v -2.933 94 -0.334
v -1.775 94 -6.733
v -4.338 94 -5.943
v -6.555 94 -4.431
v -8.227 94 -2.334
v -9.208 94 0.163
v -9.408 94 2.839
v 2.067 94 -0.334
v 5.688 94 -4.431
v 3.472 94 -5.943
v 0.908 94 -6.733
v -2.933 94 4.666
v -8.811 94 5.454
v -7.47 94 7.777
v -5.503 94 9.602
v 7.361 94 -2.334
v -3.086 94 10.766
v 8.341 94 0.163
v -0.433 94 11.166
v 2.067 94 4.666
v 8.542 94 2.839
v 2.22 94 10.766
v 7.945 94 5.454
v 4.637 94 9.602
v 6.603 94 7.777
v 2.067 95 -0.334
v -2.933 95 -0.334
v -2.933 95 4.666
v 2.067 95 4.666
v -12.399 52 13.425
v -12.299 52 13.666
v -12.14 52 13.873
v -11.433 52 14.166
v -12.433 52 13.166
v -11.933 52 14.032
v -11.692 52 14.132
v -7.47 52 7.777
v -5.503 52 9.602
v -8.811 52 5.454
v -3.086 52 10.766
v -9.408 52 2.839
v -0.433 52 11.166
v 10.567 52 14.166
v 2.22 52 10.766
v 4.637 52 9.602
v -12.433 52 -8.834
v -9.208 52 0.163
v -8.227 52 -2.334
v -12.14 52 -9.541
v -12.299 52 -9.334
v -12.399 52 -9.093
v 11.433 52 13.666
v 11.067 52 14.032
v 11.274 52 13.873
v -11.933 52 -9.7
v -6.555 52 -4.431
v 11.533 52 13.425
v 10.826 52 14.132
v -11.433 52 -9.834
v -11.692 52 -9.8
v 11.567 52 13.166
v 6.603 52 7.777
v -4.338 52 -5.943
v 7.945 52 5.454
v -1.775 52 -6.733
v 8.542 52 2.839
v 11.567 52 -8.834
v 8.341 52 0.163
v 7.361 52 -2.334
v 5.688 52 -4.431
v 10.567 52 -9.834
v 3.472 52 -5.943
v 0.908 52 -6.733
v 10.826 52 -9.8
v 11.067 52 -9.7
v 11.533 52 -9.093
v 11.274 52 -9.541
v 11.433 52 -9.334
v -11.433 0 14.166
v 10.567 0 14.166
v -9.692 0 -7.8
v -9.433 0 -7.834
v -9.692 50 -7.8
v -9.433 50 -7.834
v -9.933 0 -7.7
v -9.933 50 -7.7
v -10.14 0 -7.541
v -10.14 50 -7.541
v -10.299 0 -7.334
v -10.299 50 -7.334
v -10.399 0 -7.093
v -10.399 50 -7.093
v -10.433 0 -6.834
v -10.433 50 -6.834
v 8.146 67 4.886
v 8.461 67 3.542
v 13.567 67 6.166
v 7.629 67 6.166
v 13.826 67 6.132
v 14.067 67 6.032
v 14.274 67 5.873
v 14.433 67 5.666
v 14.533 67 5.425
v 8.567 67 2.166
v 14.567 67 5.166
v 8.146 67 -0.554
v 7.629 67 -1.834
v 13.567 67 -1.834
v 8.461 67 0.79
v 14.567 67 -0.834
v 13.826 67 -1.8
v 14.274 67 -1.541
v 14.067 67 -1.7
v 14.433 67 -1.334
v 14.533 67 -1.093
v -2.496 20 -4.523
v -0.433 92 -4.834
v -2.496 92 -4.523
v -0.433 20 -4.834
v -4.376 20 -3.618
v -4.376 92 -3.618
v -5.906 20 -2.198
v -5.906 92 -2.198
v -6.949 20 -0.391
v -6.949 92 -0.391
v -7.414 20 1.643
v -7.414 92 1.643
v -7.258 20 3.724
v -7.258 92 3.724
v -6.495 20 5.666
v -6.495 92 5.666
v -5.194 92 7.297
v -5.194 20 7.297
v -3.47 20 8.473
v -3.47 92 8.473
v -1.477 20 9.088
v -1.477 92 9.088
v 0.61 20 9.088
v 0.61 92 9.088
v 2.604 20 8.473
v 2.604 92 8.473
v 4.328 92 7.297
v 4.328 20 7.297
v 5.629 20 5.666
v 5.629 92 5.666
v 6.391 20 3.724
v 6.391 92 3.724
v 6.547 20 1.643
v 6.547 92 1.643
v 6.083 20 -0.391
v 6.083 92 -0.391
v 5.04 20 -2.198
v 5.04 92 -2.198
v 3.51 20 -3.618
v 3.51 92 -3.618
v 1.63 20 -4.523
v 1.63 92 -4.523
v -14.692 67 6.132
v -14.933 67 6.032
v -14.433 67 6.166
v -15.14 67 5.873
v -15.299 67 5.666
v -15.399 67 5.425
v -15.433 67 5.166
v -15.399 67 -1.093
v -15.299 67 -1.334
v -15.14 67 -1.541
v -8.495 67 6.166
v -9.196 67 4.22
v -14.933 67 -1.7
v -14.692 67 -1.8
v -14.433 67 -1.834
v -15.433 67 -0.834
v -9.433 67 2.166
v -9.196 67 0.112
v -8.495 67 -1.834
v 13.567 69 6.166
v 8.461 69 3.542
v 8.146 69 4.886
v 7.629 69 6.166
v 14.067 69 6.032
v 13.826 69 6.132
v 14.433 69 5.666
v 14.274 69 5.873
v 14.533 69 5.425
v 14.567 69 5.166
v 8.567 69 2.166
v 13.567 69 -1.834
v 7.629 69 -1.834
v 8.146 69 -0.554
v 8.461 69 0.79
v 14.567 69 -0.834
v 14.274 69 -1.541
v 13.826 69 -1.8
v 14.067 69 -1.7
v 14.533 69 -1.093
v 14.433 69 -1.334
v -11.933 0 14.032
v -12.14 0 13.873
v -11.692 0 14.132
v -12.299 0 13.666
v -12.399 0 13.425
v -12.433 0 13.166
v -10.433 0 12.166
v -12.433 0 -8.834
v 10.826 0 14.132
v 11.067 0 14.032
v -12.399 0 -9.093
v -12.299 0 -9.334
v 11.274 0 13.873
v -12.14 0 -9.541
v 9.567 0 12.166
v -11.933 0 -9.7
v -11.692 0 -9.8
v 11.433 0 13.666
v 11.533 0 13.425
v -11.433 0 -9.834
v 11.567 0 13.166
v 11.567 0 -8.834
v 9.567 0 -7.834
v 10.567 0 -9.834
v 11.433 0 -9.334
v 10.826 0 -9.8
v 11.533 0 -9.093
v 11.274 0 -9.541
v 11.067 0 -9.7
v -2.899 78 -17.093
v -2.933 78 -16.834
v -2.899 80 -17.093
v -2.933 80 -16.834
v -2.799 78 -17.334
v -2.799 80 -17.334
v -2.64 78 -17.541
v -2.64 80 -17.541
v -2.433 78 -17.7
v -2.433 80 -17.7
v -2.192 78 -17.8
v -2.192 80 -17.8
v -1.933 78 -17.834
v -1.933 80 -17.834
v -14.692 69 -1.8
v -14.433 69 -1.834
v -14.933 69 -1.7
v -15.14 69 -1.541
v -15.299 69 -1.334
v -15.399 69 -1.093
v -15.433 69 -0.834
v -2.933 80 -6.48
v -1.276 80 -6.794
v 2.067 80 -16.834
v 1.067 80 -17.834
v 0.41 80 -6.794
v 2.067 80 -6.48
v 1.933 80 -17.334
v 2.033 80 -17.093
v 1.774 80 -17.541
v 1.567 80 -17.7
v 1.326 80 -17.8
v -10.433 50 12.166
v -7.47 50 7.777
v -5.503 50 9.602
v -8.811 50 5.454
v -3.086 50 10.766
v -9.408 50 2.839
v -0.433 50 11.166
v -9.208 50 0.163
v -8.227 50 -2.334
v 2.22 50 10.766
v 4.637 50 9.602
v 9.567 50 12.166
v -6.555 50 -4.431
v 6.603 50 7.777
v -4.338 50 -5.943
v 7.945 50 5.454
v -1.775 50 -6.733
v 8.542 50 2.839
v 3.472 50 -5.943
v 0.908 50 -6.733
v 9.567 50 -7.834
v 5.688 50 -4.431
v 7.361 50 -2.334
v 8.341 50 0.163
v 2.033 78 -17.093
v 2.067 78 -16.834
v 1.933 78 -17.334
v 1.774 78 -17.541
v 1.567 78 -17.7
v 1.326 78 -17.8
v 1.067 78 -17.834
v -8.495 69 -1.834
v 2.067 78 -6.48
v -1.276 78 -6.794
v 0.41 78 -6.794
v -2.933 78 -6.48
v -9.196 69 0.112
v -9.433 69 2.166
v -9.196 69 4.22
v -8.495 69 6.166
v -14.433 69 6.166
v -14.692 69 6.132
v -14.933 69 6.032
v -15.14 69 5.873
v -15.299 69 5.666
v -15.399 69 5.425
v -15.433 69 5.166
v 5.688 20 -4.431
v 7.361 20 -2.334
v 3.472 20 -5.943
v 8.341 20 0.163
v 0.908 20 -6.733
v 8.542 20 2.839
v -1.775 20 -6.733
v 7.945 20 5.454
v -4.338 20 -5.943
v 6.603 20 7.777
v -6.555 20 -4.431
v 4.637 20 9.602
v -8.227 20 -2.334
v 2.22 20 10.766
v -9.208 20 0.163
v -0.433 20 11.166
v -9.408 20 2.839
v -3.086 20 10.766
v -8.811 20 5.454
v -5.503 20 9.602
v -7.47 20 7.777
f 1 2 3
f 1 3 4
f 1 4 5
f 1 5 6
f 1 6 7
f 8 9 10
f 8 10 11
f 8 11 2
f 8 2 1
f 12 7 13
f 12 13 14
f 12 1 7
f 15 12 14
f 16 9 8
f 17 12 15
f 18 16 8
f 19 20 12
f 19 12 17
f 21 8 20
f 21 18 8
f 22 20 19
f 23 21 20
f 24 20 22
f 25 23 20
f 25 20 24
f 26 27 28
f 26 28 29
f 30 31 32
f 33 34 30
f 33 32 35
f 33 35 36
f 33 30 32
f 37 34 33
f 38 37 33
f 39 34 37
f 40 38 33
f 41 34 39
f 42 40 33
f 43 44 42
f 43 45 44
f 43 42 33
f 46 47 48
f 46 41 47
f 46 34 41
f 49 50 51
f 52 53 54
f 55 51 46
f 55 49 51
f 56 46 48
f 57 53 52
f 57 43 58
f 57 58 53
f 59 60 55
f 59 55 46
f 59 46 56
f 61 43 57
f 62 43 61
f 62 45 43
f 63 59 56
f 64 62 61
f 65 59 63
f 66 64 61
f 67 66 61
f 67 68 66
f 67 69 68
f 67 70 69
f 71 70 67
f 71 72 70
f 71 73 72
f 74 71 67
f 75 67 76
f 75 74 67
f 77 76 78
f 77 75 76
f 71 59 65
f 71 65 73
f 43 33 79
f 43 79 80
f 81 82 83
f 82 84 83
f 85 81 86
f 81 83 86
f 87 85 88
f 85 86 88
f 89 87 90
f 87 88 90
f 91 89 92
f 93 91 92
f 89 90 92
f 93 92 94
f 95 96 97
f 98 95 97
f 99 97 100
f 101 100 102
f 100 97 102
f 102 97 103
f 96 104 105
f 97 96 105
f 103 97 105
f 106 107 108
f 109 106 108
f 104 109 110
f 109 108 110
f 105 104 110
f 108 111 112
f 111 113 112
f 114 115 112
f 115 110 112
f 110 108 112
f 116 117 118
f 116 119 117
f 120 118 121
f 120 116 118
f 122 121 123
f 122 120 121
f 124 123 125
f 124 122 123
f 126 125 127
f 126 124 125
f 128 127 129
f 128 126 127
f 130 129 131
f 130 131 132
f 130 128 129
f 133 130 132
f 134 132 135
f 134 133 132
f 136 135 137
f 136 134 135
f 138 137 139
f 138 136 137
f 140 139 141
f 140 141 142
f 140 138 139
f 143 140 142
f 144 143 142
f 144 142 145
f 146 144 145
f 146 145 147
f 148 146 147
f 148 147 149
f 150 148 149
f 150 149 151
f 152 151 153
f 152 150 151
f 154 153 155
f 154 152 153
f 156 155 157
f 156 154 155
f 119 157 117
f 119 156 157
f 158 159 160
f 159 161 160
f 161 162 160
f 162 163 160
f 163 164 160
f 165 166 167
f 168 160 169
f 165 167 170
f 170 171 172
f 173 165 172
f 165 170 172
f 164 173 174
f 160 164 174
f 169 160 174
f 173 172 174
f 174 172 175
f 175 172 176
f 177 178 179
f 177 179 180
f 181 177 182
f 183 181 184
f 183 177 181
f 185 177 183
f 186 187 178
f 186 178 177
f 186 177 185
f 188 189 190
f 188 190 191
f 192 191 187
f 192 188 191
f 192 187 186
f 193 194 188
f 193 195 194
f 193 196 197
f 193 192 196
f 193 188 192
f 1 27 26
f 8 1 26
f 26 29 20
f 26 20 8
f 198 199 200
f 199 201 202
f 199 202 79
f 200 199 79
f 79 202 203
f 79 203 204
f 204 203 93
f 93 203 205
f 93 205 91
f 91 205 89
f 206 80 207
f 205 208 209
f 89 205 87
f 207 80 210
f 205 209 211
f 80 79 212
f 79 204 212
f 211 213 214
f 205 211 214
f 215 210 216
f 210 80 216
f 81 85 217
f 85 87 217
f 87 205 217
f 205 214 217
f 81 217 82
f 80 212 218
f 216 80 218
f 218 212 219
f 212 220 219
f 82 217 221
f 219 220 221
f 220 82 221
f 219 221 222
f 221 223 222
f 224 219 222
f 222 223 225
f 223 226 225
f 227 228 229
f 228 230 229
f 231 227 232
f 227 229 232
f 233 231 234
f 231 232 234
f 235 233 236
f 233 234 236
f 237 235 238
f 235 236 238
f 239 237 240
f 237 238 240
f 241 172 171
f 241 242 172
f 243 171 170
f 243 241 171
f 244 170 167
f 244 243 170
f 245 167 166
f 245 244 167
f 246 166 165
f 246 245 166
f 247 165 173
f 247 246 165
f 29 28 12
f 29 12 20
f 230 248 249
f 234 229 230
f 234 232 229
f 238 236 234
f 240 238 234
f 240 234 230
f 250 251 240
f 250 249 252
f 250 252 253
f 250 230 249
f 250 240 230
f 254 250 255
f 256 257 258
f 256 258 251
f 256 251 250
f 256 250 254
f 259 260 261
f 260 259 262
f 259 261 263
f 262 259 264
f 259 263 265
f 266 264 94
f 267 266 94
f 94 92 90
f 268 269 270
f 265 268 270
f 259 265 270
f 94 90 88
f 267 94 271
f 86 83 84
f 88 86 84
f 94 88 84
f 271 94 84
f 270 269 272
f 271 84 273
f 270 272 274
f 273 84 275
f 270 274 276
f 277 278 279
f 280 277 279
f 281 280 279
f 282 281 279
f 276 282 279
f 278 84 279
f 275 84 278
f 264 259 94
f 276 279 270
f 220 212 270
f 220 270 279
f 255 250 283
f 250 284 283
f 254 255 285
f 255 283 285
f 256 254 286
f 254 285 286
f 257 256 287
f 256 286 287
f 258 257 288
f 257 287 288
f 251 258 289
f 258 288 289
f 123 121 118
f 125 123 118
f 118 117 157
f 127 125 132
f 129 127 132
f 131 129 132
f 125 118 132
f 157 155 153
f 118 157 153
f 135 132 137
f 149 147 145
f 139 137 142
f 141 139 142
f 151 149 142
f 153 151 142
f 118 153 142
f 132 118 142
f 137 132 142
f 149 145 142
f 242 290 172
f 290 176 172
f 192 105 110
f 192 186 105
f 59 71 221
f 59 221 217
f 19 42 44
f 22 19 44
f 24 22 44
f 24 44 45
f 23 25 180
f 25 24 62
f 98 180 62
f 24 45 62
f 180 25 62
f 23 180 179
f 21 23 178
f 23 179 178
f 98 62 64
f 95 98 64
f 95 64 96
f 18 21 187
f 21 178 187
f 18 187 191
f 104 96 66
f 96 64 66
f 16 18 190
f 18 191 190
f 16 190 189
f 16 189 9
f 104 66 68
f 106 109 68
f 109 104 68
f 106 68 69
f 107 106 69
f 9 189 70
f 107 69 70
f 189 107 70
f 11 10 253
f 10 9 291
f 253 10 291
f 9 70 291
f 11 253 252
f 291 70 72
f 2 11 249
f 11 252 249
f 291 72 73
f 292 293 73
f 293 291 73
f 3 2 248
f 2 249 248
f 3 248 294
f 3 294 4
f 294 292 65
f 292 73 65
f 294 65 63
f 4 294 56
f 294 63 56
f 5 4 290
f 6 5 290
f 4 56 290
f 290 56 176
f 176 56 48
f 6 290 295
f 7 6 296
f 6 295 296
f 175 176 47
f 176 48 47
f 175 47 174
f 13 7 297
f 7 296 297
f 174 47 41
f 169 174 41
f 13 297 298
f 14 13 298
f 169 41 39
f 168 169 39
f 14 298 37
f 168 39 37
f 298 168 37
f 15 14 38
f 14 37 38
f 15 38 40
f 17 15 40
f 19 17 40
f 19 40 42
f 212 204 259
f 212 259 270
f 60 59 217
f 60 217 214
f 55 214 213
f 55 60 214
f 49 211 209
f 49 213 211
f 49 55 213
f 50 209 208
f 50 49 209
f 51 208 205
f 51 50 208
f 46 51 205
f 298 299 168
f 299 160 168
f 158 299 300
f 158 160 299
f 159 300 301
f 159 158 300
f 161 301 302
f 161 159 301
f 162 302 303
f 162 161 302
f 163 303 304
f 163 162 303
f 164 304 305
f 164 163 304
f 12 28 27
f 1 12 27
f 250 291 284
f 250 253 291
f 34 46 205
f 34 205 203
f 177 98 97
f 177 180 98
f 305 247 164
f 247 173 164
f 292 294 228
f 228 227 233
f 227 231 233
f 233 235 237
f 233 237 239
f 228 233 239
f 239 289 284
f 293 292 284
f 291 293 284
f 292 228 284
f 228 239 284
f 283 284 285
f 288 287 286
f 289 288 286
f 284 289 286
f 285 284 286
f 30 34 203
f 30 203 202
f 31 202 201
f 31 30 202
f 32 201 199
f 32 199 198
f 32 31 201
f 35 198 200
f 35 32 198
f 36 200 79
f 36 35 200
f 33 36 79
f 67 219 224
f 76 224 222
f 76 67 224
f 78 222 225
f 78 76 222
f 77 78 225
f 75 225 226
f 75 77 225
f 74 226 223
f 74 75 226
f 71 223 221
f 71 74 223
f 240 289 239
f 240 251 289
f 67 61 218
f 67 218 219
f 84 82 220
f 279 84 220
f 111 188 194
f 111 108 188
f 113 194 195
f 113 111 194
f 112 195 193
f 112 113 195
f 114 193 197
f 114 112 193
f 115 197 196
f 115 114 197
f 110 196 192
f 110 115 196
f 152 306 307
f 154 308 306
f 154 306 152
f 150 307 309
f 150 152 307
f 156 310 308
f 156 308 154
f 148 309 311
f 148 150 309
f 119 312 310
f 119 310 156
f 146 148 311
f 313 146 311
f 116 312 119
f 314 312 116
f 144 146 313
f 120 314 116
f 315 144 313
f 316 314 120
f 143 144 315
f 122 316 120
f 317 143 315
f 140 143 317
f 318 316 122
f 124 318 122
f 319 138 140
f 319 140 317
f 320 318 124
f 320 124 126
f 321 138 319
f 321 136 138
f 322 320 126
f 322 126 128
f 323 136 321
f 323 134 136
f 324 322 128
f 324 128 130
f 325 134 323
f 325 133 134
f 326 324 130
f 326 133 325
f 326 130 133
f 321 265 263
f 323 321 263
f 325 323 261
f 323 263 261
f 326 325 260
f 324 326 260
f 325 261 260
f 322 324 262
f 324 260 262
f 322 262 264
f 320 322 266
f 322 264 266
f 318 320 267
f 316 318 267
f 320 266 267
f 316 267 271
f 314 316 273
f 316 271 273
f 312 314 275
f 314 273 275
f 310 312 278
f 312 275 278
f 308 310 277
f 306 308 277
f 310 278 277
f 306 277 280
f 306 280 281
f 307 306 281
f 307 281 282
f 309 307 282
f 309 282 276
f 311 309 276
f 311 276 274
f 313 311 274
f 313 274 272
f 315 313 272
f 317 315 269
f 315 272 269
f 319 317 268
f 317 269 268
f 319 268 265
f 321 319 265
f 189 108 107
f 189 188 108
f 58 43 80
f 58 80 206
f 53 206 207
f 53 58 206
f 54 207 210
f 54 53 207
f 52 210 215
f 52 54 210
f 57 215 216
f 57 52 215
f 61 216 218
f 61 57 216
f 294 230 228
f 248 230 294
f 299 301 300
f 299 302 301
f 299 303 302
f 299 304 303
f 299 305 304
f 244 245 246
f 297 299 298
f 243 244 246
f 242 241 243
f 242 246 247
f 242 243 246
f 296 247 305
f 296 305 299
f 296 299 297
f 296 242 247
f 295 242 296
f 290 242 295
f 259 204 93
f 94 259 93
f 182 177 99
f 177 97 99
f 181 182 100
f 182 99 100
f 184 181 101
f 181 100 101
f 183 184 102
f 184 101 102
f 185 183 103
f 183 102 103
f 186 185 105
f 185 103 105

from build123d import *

# Parameters (mm, degrees)
SKETCH1_W            = 24
SKETCH1_H            = 24
SKETCH1_W_2          = 20
SKETCH1_H_2          = 20
BOSS_EXTRUDE1_DEPTH  = 50
FILLET1_R            = 1
FILLET2_R            = 1
BOSS_EXTRUDE7_START  = 2
BOSS_EXTRUDE7_DEPTH  = 2
SKETCH9_R            = 9
BOSS_EXTRUDE9_DEPTH  = 30
SKETCH10_R           = 7
CUT_EXTRUDE1_DEPTH   = 34
SKETCH11_R           = 9
SKETCH11_R_2         = 7
BOSS_EXTRUDE10_DEPTH = 40
BOSS_EXTRUDE12_DEPTH = 1
FILLET3_R            = 1
SKETCH15_R           = 9
BOSS_EXTRUDE13_DEPTH = 2
BOSS_EXTRUDE15_DEPTH = 1
FILLET5_R            = 1
SKETCH18_W           = 5
SKETCH18_H           = 5
BOSS_EXTRUDE16_DEPTH = 1


with BuildPart() as part:
    # Sketch1 → Boss-Extrude1 (new body)
    with BuildSketch(Plane(origin=(0, 0, 0), x_dir=(1, 0, 0), z_dir=(0, 1, 0))):
        with Locations((-0.433212996, -2.166064982)):
            Rectangle(SKETCH1_W, SKETCH1_H)
        with Locations((-0.433212996, -2.166064982)):
            Rectangle(SKETCH1_W_2, SKETCH1_H_2, mode=Mode.SUBTRACT)
    extrude(amount=BOSS_EXTRUDE1_DEPTH)

    # Fillet1
    fillet1_edges = [part.edges().sort_by_distance(p)[0] for p in [
        (-10.433212996, 25, -7.833935018),
        (11.566787004, 25, -9.833935018),
        (11.566787004, 25, 14.166064982),
        (-12.433212996, 25, 14.166064982),
    ]]
    fillet(fillet1_edges, radius=FILLET1_R)

    # Fillet2
    fillet2_edges = [part.edges().sort_by_distance(p)[0] for p in [
        (-12.433212996, 25, -9.833935018),
    ]]
    fillet(fillet2_edges, radius=FILLET2_R)

    # Sketch8 → Boss-Extrude7 (add)
    with BuildSketch(Plane(origin=(0, 50, 0), x_dir=(1, 0, 0), z_dir=(0, 1, 0)).offset(BOSS_EXTRUDE7_START)):
        with BuildLine():
            Line((10.566787004, 9.833935018), (-11.433212996, 9.833935018))
            ThreePointArc((-11.433212996, 9.833935018), (-12.140319778, 9.541041799), (-12.433212996, 8.833935018))
            Line((-12.433212996, 8.833935018), (-12.433212996, -13.166064982))
            ThreePointArc((-12.433212996, -13.166064982), (-12.140319778, -13.873171763), (-11.433212996, -14.166064982))
            Line((-11.433212996, -14.166064982), (10.566787004, -14.166064982))
            ThreePointArc((10.566787004, -14.166064982), (11.273893785, -13.873171763), (11.566787004, -13.166064982))
            Line((11.566787004, -13.166064982), (11.566787004, 8.833935018))
            ThreePointArc((11.566787004, 8.833935018), (11.273893785, 9.541041799), (10.566787004, 9.833935018))
        make_face()
    extrude(amount=-BOSS_EXTRUDE7_DEPTH)

    # Sketch9 → Boss-Extrude9 (add)
    with BuildSketch(Plane.XZ.offset(-50)):
        with Locations(Location((-0.433212996, 2.166064982, 0), (0, 0, 90))):
            Circle(SKETCH9_R)
    extrude(amount=BOSS_EXTRUDE9_DEPTH)

    # Sketch10 → Cut-Extrude1 (cut)
    with BuildSketch(Plane.XZ.offset(-20)):
        with Locations(Location((-0.433212996, 2.166064982, 0), (0, 0, 270))):
            Circle(SKETCH10_R)
    extrude(amount=-CUT_EXTRUDE1_DEPTH, mode=Mode.SUBTRACT)

    # Sketch11 → Boss-Extrude10 (add)
    with BuildSketch(Plane(origin=(0, 52, 0), x_dir=(1, 0, 0), z_dir=(0, 1, 0))):
        with Locations(Location((-0.433212996, -2.166064982, 0), (0, 0, 270))):
            Circle(SKETCH11_R)
        with Locations(Location((-0.433212996, -2.166064982, 0), (0, 0, 90))):
            Circle(SKETCH11_R_2, mode=Mode.SUBTRACT)
    extrude(amount=BOSS_EXTRUDE10_DEPTH)

    # Sketch14 → Boss-Extrude12 (add, symmetric)
    with BuildSketch(Plane(origin=(0, 68, 0), x_dir=(1, 0, 0), z_dir=(0, 1, 0))):
        with BuildLine():
            ThreePointArc((-8.495470745, -6.166064982), (-9.433212996, -2.166064982), (-8.495470745, 1.833935018))
            Line((-8.495470745, 1.833935018), (-15.433212996, 1.833935018))
            Line((-15.433212996, 1.833935018), (-15.433212996, -6.166064982))
            Line((-15.433212996, -6.166064982), (-8.495470745, -6.166064982))
        make_face()
        with BuildLine():
            Line((14.566787004, 1.833935018), (7.629044752, 1.833935018))
            ThreePointArc((7.629044752, 1.833935018), (8.329215883, -0.111840035), (8.566787004, -2.166064982))
            ThreePointArc((8.566787004, -2.166064982), (8.329215883, -4.220289929), (7.629044752, -6.166064982))
            Line((7.629044752, -6.166064982), (14.566787004, -6.166064982))
            Line((14.566787004, -6.166064982), (14.566787004, 1.833935018))
        make_face()
    extrude(amount=BOSS_EXTRUDE12_DEPTH, both=True)

    # Fillet3
    fillet3_edges = [part.edges().sort_by_distance(p)[0] for p in [
        (-15.433212996, 68, -1.833935018),
        (-15.433212996, 68, 6.166064982),
        (14.566787004, 68, 6.166064982),
        (14.566787004, 68, -1.833935018),
    ]]
    fillet(fillet3_edges, radius=FILLET3_R)

    # Sketch15 → Boss-Extrude13 (add)
    with BuildSketch(Plane(origin=(0, 92, 0), x_dir=(1, 0, 0), z_dir=(0, 1, 0))):
        with Locations(Location((-0.433212996, -2.166064982, 0), (0, 0, 270))):
            Circle(SKETCH15_R)
    extrude(amount=BOSS_EXTRUDE13_DEPTH)

    # Sketch17 → Boss-Extrude15 (add, symmetric)
    with BuildSketch(Plane(origin=(0, 79, 0), x_dir=(1, 0, 0), z_dir=(0, 1, 0))):
        with BuildLine():
            Line((2.066787004, 17.833935018), (-2.933212996, 17.833935018))
            Line((-2.933212996, 17.833935018), (-2.933212996, 6.479743251))
            ThreePointArc((-2.933212996, 6.479743251), (-0.433212996, 6.833935018), (2.066787004, 6.479743251))
            Line((2.066787004, 6.479743251), (2.066787004, 17.833935018))
        make_face()
    extrude(amount=BOSS_EXTRUDE15_DEPTH, both=True)

    # Fillet5
    fillet5_edges = [part.edges().sort_by_distance(p)[0] for p in [
        (2.066787004, 79, -17.833935018),
        (-2.933212996, 79, -17.833935018),
    ]]
    fillet(fillet5_edges, radius=FILLET5_R)

    # Sketch18 → Boss-Extrude16 (add, symmetric)
    with BuildSketch(Plane(origin=(0, 94, 0), x_dir=(1, 0, 0), z_dir=(0, 1, 0))):
        with Locations((-0.433212996, -2.166064982)):
            Rectangle(SKETCH18_W, SKETCH18_H)
    extrude(amount=BOSS_EXTRUDE16_DEPTH, both=True)


solid = part.part
